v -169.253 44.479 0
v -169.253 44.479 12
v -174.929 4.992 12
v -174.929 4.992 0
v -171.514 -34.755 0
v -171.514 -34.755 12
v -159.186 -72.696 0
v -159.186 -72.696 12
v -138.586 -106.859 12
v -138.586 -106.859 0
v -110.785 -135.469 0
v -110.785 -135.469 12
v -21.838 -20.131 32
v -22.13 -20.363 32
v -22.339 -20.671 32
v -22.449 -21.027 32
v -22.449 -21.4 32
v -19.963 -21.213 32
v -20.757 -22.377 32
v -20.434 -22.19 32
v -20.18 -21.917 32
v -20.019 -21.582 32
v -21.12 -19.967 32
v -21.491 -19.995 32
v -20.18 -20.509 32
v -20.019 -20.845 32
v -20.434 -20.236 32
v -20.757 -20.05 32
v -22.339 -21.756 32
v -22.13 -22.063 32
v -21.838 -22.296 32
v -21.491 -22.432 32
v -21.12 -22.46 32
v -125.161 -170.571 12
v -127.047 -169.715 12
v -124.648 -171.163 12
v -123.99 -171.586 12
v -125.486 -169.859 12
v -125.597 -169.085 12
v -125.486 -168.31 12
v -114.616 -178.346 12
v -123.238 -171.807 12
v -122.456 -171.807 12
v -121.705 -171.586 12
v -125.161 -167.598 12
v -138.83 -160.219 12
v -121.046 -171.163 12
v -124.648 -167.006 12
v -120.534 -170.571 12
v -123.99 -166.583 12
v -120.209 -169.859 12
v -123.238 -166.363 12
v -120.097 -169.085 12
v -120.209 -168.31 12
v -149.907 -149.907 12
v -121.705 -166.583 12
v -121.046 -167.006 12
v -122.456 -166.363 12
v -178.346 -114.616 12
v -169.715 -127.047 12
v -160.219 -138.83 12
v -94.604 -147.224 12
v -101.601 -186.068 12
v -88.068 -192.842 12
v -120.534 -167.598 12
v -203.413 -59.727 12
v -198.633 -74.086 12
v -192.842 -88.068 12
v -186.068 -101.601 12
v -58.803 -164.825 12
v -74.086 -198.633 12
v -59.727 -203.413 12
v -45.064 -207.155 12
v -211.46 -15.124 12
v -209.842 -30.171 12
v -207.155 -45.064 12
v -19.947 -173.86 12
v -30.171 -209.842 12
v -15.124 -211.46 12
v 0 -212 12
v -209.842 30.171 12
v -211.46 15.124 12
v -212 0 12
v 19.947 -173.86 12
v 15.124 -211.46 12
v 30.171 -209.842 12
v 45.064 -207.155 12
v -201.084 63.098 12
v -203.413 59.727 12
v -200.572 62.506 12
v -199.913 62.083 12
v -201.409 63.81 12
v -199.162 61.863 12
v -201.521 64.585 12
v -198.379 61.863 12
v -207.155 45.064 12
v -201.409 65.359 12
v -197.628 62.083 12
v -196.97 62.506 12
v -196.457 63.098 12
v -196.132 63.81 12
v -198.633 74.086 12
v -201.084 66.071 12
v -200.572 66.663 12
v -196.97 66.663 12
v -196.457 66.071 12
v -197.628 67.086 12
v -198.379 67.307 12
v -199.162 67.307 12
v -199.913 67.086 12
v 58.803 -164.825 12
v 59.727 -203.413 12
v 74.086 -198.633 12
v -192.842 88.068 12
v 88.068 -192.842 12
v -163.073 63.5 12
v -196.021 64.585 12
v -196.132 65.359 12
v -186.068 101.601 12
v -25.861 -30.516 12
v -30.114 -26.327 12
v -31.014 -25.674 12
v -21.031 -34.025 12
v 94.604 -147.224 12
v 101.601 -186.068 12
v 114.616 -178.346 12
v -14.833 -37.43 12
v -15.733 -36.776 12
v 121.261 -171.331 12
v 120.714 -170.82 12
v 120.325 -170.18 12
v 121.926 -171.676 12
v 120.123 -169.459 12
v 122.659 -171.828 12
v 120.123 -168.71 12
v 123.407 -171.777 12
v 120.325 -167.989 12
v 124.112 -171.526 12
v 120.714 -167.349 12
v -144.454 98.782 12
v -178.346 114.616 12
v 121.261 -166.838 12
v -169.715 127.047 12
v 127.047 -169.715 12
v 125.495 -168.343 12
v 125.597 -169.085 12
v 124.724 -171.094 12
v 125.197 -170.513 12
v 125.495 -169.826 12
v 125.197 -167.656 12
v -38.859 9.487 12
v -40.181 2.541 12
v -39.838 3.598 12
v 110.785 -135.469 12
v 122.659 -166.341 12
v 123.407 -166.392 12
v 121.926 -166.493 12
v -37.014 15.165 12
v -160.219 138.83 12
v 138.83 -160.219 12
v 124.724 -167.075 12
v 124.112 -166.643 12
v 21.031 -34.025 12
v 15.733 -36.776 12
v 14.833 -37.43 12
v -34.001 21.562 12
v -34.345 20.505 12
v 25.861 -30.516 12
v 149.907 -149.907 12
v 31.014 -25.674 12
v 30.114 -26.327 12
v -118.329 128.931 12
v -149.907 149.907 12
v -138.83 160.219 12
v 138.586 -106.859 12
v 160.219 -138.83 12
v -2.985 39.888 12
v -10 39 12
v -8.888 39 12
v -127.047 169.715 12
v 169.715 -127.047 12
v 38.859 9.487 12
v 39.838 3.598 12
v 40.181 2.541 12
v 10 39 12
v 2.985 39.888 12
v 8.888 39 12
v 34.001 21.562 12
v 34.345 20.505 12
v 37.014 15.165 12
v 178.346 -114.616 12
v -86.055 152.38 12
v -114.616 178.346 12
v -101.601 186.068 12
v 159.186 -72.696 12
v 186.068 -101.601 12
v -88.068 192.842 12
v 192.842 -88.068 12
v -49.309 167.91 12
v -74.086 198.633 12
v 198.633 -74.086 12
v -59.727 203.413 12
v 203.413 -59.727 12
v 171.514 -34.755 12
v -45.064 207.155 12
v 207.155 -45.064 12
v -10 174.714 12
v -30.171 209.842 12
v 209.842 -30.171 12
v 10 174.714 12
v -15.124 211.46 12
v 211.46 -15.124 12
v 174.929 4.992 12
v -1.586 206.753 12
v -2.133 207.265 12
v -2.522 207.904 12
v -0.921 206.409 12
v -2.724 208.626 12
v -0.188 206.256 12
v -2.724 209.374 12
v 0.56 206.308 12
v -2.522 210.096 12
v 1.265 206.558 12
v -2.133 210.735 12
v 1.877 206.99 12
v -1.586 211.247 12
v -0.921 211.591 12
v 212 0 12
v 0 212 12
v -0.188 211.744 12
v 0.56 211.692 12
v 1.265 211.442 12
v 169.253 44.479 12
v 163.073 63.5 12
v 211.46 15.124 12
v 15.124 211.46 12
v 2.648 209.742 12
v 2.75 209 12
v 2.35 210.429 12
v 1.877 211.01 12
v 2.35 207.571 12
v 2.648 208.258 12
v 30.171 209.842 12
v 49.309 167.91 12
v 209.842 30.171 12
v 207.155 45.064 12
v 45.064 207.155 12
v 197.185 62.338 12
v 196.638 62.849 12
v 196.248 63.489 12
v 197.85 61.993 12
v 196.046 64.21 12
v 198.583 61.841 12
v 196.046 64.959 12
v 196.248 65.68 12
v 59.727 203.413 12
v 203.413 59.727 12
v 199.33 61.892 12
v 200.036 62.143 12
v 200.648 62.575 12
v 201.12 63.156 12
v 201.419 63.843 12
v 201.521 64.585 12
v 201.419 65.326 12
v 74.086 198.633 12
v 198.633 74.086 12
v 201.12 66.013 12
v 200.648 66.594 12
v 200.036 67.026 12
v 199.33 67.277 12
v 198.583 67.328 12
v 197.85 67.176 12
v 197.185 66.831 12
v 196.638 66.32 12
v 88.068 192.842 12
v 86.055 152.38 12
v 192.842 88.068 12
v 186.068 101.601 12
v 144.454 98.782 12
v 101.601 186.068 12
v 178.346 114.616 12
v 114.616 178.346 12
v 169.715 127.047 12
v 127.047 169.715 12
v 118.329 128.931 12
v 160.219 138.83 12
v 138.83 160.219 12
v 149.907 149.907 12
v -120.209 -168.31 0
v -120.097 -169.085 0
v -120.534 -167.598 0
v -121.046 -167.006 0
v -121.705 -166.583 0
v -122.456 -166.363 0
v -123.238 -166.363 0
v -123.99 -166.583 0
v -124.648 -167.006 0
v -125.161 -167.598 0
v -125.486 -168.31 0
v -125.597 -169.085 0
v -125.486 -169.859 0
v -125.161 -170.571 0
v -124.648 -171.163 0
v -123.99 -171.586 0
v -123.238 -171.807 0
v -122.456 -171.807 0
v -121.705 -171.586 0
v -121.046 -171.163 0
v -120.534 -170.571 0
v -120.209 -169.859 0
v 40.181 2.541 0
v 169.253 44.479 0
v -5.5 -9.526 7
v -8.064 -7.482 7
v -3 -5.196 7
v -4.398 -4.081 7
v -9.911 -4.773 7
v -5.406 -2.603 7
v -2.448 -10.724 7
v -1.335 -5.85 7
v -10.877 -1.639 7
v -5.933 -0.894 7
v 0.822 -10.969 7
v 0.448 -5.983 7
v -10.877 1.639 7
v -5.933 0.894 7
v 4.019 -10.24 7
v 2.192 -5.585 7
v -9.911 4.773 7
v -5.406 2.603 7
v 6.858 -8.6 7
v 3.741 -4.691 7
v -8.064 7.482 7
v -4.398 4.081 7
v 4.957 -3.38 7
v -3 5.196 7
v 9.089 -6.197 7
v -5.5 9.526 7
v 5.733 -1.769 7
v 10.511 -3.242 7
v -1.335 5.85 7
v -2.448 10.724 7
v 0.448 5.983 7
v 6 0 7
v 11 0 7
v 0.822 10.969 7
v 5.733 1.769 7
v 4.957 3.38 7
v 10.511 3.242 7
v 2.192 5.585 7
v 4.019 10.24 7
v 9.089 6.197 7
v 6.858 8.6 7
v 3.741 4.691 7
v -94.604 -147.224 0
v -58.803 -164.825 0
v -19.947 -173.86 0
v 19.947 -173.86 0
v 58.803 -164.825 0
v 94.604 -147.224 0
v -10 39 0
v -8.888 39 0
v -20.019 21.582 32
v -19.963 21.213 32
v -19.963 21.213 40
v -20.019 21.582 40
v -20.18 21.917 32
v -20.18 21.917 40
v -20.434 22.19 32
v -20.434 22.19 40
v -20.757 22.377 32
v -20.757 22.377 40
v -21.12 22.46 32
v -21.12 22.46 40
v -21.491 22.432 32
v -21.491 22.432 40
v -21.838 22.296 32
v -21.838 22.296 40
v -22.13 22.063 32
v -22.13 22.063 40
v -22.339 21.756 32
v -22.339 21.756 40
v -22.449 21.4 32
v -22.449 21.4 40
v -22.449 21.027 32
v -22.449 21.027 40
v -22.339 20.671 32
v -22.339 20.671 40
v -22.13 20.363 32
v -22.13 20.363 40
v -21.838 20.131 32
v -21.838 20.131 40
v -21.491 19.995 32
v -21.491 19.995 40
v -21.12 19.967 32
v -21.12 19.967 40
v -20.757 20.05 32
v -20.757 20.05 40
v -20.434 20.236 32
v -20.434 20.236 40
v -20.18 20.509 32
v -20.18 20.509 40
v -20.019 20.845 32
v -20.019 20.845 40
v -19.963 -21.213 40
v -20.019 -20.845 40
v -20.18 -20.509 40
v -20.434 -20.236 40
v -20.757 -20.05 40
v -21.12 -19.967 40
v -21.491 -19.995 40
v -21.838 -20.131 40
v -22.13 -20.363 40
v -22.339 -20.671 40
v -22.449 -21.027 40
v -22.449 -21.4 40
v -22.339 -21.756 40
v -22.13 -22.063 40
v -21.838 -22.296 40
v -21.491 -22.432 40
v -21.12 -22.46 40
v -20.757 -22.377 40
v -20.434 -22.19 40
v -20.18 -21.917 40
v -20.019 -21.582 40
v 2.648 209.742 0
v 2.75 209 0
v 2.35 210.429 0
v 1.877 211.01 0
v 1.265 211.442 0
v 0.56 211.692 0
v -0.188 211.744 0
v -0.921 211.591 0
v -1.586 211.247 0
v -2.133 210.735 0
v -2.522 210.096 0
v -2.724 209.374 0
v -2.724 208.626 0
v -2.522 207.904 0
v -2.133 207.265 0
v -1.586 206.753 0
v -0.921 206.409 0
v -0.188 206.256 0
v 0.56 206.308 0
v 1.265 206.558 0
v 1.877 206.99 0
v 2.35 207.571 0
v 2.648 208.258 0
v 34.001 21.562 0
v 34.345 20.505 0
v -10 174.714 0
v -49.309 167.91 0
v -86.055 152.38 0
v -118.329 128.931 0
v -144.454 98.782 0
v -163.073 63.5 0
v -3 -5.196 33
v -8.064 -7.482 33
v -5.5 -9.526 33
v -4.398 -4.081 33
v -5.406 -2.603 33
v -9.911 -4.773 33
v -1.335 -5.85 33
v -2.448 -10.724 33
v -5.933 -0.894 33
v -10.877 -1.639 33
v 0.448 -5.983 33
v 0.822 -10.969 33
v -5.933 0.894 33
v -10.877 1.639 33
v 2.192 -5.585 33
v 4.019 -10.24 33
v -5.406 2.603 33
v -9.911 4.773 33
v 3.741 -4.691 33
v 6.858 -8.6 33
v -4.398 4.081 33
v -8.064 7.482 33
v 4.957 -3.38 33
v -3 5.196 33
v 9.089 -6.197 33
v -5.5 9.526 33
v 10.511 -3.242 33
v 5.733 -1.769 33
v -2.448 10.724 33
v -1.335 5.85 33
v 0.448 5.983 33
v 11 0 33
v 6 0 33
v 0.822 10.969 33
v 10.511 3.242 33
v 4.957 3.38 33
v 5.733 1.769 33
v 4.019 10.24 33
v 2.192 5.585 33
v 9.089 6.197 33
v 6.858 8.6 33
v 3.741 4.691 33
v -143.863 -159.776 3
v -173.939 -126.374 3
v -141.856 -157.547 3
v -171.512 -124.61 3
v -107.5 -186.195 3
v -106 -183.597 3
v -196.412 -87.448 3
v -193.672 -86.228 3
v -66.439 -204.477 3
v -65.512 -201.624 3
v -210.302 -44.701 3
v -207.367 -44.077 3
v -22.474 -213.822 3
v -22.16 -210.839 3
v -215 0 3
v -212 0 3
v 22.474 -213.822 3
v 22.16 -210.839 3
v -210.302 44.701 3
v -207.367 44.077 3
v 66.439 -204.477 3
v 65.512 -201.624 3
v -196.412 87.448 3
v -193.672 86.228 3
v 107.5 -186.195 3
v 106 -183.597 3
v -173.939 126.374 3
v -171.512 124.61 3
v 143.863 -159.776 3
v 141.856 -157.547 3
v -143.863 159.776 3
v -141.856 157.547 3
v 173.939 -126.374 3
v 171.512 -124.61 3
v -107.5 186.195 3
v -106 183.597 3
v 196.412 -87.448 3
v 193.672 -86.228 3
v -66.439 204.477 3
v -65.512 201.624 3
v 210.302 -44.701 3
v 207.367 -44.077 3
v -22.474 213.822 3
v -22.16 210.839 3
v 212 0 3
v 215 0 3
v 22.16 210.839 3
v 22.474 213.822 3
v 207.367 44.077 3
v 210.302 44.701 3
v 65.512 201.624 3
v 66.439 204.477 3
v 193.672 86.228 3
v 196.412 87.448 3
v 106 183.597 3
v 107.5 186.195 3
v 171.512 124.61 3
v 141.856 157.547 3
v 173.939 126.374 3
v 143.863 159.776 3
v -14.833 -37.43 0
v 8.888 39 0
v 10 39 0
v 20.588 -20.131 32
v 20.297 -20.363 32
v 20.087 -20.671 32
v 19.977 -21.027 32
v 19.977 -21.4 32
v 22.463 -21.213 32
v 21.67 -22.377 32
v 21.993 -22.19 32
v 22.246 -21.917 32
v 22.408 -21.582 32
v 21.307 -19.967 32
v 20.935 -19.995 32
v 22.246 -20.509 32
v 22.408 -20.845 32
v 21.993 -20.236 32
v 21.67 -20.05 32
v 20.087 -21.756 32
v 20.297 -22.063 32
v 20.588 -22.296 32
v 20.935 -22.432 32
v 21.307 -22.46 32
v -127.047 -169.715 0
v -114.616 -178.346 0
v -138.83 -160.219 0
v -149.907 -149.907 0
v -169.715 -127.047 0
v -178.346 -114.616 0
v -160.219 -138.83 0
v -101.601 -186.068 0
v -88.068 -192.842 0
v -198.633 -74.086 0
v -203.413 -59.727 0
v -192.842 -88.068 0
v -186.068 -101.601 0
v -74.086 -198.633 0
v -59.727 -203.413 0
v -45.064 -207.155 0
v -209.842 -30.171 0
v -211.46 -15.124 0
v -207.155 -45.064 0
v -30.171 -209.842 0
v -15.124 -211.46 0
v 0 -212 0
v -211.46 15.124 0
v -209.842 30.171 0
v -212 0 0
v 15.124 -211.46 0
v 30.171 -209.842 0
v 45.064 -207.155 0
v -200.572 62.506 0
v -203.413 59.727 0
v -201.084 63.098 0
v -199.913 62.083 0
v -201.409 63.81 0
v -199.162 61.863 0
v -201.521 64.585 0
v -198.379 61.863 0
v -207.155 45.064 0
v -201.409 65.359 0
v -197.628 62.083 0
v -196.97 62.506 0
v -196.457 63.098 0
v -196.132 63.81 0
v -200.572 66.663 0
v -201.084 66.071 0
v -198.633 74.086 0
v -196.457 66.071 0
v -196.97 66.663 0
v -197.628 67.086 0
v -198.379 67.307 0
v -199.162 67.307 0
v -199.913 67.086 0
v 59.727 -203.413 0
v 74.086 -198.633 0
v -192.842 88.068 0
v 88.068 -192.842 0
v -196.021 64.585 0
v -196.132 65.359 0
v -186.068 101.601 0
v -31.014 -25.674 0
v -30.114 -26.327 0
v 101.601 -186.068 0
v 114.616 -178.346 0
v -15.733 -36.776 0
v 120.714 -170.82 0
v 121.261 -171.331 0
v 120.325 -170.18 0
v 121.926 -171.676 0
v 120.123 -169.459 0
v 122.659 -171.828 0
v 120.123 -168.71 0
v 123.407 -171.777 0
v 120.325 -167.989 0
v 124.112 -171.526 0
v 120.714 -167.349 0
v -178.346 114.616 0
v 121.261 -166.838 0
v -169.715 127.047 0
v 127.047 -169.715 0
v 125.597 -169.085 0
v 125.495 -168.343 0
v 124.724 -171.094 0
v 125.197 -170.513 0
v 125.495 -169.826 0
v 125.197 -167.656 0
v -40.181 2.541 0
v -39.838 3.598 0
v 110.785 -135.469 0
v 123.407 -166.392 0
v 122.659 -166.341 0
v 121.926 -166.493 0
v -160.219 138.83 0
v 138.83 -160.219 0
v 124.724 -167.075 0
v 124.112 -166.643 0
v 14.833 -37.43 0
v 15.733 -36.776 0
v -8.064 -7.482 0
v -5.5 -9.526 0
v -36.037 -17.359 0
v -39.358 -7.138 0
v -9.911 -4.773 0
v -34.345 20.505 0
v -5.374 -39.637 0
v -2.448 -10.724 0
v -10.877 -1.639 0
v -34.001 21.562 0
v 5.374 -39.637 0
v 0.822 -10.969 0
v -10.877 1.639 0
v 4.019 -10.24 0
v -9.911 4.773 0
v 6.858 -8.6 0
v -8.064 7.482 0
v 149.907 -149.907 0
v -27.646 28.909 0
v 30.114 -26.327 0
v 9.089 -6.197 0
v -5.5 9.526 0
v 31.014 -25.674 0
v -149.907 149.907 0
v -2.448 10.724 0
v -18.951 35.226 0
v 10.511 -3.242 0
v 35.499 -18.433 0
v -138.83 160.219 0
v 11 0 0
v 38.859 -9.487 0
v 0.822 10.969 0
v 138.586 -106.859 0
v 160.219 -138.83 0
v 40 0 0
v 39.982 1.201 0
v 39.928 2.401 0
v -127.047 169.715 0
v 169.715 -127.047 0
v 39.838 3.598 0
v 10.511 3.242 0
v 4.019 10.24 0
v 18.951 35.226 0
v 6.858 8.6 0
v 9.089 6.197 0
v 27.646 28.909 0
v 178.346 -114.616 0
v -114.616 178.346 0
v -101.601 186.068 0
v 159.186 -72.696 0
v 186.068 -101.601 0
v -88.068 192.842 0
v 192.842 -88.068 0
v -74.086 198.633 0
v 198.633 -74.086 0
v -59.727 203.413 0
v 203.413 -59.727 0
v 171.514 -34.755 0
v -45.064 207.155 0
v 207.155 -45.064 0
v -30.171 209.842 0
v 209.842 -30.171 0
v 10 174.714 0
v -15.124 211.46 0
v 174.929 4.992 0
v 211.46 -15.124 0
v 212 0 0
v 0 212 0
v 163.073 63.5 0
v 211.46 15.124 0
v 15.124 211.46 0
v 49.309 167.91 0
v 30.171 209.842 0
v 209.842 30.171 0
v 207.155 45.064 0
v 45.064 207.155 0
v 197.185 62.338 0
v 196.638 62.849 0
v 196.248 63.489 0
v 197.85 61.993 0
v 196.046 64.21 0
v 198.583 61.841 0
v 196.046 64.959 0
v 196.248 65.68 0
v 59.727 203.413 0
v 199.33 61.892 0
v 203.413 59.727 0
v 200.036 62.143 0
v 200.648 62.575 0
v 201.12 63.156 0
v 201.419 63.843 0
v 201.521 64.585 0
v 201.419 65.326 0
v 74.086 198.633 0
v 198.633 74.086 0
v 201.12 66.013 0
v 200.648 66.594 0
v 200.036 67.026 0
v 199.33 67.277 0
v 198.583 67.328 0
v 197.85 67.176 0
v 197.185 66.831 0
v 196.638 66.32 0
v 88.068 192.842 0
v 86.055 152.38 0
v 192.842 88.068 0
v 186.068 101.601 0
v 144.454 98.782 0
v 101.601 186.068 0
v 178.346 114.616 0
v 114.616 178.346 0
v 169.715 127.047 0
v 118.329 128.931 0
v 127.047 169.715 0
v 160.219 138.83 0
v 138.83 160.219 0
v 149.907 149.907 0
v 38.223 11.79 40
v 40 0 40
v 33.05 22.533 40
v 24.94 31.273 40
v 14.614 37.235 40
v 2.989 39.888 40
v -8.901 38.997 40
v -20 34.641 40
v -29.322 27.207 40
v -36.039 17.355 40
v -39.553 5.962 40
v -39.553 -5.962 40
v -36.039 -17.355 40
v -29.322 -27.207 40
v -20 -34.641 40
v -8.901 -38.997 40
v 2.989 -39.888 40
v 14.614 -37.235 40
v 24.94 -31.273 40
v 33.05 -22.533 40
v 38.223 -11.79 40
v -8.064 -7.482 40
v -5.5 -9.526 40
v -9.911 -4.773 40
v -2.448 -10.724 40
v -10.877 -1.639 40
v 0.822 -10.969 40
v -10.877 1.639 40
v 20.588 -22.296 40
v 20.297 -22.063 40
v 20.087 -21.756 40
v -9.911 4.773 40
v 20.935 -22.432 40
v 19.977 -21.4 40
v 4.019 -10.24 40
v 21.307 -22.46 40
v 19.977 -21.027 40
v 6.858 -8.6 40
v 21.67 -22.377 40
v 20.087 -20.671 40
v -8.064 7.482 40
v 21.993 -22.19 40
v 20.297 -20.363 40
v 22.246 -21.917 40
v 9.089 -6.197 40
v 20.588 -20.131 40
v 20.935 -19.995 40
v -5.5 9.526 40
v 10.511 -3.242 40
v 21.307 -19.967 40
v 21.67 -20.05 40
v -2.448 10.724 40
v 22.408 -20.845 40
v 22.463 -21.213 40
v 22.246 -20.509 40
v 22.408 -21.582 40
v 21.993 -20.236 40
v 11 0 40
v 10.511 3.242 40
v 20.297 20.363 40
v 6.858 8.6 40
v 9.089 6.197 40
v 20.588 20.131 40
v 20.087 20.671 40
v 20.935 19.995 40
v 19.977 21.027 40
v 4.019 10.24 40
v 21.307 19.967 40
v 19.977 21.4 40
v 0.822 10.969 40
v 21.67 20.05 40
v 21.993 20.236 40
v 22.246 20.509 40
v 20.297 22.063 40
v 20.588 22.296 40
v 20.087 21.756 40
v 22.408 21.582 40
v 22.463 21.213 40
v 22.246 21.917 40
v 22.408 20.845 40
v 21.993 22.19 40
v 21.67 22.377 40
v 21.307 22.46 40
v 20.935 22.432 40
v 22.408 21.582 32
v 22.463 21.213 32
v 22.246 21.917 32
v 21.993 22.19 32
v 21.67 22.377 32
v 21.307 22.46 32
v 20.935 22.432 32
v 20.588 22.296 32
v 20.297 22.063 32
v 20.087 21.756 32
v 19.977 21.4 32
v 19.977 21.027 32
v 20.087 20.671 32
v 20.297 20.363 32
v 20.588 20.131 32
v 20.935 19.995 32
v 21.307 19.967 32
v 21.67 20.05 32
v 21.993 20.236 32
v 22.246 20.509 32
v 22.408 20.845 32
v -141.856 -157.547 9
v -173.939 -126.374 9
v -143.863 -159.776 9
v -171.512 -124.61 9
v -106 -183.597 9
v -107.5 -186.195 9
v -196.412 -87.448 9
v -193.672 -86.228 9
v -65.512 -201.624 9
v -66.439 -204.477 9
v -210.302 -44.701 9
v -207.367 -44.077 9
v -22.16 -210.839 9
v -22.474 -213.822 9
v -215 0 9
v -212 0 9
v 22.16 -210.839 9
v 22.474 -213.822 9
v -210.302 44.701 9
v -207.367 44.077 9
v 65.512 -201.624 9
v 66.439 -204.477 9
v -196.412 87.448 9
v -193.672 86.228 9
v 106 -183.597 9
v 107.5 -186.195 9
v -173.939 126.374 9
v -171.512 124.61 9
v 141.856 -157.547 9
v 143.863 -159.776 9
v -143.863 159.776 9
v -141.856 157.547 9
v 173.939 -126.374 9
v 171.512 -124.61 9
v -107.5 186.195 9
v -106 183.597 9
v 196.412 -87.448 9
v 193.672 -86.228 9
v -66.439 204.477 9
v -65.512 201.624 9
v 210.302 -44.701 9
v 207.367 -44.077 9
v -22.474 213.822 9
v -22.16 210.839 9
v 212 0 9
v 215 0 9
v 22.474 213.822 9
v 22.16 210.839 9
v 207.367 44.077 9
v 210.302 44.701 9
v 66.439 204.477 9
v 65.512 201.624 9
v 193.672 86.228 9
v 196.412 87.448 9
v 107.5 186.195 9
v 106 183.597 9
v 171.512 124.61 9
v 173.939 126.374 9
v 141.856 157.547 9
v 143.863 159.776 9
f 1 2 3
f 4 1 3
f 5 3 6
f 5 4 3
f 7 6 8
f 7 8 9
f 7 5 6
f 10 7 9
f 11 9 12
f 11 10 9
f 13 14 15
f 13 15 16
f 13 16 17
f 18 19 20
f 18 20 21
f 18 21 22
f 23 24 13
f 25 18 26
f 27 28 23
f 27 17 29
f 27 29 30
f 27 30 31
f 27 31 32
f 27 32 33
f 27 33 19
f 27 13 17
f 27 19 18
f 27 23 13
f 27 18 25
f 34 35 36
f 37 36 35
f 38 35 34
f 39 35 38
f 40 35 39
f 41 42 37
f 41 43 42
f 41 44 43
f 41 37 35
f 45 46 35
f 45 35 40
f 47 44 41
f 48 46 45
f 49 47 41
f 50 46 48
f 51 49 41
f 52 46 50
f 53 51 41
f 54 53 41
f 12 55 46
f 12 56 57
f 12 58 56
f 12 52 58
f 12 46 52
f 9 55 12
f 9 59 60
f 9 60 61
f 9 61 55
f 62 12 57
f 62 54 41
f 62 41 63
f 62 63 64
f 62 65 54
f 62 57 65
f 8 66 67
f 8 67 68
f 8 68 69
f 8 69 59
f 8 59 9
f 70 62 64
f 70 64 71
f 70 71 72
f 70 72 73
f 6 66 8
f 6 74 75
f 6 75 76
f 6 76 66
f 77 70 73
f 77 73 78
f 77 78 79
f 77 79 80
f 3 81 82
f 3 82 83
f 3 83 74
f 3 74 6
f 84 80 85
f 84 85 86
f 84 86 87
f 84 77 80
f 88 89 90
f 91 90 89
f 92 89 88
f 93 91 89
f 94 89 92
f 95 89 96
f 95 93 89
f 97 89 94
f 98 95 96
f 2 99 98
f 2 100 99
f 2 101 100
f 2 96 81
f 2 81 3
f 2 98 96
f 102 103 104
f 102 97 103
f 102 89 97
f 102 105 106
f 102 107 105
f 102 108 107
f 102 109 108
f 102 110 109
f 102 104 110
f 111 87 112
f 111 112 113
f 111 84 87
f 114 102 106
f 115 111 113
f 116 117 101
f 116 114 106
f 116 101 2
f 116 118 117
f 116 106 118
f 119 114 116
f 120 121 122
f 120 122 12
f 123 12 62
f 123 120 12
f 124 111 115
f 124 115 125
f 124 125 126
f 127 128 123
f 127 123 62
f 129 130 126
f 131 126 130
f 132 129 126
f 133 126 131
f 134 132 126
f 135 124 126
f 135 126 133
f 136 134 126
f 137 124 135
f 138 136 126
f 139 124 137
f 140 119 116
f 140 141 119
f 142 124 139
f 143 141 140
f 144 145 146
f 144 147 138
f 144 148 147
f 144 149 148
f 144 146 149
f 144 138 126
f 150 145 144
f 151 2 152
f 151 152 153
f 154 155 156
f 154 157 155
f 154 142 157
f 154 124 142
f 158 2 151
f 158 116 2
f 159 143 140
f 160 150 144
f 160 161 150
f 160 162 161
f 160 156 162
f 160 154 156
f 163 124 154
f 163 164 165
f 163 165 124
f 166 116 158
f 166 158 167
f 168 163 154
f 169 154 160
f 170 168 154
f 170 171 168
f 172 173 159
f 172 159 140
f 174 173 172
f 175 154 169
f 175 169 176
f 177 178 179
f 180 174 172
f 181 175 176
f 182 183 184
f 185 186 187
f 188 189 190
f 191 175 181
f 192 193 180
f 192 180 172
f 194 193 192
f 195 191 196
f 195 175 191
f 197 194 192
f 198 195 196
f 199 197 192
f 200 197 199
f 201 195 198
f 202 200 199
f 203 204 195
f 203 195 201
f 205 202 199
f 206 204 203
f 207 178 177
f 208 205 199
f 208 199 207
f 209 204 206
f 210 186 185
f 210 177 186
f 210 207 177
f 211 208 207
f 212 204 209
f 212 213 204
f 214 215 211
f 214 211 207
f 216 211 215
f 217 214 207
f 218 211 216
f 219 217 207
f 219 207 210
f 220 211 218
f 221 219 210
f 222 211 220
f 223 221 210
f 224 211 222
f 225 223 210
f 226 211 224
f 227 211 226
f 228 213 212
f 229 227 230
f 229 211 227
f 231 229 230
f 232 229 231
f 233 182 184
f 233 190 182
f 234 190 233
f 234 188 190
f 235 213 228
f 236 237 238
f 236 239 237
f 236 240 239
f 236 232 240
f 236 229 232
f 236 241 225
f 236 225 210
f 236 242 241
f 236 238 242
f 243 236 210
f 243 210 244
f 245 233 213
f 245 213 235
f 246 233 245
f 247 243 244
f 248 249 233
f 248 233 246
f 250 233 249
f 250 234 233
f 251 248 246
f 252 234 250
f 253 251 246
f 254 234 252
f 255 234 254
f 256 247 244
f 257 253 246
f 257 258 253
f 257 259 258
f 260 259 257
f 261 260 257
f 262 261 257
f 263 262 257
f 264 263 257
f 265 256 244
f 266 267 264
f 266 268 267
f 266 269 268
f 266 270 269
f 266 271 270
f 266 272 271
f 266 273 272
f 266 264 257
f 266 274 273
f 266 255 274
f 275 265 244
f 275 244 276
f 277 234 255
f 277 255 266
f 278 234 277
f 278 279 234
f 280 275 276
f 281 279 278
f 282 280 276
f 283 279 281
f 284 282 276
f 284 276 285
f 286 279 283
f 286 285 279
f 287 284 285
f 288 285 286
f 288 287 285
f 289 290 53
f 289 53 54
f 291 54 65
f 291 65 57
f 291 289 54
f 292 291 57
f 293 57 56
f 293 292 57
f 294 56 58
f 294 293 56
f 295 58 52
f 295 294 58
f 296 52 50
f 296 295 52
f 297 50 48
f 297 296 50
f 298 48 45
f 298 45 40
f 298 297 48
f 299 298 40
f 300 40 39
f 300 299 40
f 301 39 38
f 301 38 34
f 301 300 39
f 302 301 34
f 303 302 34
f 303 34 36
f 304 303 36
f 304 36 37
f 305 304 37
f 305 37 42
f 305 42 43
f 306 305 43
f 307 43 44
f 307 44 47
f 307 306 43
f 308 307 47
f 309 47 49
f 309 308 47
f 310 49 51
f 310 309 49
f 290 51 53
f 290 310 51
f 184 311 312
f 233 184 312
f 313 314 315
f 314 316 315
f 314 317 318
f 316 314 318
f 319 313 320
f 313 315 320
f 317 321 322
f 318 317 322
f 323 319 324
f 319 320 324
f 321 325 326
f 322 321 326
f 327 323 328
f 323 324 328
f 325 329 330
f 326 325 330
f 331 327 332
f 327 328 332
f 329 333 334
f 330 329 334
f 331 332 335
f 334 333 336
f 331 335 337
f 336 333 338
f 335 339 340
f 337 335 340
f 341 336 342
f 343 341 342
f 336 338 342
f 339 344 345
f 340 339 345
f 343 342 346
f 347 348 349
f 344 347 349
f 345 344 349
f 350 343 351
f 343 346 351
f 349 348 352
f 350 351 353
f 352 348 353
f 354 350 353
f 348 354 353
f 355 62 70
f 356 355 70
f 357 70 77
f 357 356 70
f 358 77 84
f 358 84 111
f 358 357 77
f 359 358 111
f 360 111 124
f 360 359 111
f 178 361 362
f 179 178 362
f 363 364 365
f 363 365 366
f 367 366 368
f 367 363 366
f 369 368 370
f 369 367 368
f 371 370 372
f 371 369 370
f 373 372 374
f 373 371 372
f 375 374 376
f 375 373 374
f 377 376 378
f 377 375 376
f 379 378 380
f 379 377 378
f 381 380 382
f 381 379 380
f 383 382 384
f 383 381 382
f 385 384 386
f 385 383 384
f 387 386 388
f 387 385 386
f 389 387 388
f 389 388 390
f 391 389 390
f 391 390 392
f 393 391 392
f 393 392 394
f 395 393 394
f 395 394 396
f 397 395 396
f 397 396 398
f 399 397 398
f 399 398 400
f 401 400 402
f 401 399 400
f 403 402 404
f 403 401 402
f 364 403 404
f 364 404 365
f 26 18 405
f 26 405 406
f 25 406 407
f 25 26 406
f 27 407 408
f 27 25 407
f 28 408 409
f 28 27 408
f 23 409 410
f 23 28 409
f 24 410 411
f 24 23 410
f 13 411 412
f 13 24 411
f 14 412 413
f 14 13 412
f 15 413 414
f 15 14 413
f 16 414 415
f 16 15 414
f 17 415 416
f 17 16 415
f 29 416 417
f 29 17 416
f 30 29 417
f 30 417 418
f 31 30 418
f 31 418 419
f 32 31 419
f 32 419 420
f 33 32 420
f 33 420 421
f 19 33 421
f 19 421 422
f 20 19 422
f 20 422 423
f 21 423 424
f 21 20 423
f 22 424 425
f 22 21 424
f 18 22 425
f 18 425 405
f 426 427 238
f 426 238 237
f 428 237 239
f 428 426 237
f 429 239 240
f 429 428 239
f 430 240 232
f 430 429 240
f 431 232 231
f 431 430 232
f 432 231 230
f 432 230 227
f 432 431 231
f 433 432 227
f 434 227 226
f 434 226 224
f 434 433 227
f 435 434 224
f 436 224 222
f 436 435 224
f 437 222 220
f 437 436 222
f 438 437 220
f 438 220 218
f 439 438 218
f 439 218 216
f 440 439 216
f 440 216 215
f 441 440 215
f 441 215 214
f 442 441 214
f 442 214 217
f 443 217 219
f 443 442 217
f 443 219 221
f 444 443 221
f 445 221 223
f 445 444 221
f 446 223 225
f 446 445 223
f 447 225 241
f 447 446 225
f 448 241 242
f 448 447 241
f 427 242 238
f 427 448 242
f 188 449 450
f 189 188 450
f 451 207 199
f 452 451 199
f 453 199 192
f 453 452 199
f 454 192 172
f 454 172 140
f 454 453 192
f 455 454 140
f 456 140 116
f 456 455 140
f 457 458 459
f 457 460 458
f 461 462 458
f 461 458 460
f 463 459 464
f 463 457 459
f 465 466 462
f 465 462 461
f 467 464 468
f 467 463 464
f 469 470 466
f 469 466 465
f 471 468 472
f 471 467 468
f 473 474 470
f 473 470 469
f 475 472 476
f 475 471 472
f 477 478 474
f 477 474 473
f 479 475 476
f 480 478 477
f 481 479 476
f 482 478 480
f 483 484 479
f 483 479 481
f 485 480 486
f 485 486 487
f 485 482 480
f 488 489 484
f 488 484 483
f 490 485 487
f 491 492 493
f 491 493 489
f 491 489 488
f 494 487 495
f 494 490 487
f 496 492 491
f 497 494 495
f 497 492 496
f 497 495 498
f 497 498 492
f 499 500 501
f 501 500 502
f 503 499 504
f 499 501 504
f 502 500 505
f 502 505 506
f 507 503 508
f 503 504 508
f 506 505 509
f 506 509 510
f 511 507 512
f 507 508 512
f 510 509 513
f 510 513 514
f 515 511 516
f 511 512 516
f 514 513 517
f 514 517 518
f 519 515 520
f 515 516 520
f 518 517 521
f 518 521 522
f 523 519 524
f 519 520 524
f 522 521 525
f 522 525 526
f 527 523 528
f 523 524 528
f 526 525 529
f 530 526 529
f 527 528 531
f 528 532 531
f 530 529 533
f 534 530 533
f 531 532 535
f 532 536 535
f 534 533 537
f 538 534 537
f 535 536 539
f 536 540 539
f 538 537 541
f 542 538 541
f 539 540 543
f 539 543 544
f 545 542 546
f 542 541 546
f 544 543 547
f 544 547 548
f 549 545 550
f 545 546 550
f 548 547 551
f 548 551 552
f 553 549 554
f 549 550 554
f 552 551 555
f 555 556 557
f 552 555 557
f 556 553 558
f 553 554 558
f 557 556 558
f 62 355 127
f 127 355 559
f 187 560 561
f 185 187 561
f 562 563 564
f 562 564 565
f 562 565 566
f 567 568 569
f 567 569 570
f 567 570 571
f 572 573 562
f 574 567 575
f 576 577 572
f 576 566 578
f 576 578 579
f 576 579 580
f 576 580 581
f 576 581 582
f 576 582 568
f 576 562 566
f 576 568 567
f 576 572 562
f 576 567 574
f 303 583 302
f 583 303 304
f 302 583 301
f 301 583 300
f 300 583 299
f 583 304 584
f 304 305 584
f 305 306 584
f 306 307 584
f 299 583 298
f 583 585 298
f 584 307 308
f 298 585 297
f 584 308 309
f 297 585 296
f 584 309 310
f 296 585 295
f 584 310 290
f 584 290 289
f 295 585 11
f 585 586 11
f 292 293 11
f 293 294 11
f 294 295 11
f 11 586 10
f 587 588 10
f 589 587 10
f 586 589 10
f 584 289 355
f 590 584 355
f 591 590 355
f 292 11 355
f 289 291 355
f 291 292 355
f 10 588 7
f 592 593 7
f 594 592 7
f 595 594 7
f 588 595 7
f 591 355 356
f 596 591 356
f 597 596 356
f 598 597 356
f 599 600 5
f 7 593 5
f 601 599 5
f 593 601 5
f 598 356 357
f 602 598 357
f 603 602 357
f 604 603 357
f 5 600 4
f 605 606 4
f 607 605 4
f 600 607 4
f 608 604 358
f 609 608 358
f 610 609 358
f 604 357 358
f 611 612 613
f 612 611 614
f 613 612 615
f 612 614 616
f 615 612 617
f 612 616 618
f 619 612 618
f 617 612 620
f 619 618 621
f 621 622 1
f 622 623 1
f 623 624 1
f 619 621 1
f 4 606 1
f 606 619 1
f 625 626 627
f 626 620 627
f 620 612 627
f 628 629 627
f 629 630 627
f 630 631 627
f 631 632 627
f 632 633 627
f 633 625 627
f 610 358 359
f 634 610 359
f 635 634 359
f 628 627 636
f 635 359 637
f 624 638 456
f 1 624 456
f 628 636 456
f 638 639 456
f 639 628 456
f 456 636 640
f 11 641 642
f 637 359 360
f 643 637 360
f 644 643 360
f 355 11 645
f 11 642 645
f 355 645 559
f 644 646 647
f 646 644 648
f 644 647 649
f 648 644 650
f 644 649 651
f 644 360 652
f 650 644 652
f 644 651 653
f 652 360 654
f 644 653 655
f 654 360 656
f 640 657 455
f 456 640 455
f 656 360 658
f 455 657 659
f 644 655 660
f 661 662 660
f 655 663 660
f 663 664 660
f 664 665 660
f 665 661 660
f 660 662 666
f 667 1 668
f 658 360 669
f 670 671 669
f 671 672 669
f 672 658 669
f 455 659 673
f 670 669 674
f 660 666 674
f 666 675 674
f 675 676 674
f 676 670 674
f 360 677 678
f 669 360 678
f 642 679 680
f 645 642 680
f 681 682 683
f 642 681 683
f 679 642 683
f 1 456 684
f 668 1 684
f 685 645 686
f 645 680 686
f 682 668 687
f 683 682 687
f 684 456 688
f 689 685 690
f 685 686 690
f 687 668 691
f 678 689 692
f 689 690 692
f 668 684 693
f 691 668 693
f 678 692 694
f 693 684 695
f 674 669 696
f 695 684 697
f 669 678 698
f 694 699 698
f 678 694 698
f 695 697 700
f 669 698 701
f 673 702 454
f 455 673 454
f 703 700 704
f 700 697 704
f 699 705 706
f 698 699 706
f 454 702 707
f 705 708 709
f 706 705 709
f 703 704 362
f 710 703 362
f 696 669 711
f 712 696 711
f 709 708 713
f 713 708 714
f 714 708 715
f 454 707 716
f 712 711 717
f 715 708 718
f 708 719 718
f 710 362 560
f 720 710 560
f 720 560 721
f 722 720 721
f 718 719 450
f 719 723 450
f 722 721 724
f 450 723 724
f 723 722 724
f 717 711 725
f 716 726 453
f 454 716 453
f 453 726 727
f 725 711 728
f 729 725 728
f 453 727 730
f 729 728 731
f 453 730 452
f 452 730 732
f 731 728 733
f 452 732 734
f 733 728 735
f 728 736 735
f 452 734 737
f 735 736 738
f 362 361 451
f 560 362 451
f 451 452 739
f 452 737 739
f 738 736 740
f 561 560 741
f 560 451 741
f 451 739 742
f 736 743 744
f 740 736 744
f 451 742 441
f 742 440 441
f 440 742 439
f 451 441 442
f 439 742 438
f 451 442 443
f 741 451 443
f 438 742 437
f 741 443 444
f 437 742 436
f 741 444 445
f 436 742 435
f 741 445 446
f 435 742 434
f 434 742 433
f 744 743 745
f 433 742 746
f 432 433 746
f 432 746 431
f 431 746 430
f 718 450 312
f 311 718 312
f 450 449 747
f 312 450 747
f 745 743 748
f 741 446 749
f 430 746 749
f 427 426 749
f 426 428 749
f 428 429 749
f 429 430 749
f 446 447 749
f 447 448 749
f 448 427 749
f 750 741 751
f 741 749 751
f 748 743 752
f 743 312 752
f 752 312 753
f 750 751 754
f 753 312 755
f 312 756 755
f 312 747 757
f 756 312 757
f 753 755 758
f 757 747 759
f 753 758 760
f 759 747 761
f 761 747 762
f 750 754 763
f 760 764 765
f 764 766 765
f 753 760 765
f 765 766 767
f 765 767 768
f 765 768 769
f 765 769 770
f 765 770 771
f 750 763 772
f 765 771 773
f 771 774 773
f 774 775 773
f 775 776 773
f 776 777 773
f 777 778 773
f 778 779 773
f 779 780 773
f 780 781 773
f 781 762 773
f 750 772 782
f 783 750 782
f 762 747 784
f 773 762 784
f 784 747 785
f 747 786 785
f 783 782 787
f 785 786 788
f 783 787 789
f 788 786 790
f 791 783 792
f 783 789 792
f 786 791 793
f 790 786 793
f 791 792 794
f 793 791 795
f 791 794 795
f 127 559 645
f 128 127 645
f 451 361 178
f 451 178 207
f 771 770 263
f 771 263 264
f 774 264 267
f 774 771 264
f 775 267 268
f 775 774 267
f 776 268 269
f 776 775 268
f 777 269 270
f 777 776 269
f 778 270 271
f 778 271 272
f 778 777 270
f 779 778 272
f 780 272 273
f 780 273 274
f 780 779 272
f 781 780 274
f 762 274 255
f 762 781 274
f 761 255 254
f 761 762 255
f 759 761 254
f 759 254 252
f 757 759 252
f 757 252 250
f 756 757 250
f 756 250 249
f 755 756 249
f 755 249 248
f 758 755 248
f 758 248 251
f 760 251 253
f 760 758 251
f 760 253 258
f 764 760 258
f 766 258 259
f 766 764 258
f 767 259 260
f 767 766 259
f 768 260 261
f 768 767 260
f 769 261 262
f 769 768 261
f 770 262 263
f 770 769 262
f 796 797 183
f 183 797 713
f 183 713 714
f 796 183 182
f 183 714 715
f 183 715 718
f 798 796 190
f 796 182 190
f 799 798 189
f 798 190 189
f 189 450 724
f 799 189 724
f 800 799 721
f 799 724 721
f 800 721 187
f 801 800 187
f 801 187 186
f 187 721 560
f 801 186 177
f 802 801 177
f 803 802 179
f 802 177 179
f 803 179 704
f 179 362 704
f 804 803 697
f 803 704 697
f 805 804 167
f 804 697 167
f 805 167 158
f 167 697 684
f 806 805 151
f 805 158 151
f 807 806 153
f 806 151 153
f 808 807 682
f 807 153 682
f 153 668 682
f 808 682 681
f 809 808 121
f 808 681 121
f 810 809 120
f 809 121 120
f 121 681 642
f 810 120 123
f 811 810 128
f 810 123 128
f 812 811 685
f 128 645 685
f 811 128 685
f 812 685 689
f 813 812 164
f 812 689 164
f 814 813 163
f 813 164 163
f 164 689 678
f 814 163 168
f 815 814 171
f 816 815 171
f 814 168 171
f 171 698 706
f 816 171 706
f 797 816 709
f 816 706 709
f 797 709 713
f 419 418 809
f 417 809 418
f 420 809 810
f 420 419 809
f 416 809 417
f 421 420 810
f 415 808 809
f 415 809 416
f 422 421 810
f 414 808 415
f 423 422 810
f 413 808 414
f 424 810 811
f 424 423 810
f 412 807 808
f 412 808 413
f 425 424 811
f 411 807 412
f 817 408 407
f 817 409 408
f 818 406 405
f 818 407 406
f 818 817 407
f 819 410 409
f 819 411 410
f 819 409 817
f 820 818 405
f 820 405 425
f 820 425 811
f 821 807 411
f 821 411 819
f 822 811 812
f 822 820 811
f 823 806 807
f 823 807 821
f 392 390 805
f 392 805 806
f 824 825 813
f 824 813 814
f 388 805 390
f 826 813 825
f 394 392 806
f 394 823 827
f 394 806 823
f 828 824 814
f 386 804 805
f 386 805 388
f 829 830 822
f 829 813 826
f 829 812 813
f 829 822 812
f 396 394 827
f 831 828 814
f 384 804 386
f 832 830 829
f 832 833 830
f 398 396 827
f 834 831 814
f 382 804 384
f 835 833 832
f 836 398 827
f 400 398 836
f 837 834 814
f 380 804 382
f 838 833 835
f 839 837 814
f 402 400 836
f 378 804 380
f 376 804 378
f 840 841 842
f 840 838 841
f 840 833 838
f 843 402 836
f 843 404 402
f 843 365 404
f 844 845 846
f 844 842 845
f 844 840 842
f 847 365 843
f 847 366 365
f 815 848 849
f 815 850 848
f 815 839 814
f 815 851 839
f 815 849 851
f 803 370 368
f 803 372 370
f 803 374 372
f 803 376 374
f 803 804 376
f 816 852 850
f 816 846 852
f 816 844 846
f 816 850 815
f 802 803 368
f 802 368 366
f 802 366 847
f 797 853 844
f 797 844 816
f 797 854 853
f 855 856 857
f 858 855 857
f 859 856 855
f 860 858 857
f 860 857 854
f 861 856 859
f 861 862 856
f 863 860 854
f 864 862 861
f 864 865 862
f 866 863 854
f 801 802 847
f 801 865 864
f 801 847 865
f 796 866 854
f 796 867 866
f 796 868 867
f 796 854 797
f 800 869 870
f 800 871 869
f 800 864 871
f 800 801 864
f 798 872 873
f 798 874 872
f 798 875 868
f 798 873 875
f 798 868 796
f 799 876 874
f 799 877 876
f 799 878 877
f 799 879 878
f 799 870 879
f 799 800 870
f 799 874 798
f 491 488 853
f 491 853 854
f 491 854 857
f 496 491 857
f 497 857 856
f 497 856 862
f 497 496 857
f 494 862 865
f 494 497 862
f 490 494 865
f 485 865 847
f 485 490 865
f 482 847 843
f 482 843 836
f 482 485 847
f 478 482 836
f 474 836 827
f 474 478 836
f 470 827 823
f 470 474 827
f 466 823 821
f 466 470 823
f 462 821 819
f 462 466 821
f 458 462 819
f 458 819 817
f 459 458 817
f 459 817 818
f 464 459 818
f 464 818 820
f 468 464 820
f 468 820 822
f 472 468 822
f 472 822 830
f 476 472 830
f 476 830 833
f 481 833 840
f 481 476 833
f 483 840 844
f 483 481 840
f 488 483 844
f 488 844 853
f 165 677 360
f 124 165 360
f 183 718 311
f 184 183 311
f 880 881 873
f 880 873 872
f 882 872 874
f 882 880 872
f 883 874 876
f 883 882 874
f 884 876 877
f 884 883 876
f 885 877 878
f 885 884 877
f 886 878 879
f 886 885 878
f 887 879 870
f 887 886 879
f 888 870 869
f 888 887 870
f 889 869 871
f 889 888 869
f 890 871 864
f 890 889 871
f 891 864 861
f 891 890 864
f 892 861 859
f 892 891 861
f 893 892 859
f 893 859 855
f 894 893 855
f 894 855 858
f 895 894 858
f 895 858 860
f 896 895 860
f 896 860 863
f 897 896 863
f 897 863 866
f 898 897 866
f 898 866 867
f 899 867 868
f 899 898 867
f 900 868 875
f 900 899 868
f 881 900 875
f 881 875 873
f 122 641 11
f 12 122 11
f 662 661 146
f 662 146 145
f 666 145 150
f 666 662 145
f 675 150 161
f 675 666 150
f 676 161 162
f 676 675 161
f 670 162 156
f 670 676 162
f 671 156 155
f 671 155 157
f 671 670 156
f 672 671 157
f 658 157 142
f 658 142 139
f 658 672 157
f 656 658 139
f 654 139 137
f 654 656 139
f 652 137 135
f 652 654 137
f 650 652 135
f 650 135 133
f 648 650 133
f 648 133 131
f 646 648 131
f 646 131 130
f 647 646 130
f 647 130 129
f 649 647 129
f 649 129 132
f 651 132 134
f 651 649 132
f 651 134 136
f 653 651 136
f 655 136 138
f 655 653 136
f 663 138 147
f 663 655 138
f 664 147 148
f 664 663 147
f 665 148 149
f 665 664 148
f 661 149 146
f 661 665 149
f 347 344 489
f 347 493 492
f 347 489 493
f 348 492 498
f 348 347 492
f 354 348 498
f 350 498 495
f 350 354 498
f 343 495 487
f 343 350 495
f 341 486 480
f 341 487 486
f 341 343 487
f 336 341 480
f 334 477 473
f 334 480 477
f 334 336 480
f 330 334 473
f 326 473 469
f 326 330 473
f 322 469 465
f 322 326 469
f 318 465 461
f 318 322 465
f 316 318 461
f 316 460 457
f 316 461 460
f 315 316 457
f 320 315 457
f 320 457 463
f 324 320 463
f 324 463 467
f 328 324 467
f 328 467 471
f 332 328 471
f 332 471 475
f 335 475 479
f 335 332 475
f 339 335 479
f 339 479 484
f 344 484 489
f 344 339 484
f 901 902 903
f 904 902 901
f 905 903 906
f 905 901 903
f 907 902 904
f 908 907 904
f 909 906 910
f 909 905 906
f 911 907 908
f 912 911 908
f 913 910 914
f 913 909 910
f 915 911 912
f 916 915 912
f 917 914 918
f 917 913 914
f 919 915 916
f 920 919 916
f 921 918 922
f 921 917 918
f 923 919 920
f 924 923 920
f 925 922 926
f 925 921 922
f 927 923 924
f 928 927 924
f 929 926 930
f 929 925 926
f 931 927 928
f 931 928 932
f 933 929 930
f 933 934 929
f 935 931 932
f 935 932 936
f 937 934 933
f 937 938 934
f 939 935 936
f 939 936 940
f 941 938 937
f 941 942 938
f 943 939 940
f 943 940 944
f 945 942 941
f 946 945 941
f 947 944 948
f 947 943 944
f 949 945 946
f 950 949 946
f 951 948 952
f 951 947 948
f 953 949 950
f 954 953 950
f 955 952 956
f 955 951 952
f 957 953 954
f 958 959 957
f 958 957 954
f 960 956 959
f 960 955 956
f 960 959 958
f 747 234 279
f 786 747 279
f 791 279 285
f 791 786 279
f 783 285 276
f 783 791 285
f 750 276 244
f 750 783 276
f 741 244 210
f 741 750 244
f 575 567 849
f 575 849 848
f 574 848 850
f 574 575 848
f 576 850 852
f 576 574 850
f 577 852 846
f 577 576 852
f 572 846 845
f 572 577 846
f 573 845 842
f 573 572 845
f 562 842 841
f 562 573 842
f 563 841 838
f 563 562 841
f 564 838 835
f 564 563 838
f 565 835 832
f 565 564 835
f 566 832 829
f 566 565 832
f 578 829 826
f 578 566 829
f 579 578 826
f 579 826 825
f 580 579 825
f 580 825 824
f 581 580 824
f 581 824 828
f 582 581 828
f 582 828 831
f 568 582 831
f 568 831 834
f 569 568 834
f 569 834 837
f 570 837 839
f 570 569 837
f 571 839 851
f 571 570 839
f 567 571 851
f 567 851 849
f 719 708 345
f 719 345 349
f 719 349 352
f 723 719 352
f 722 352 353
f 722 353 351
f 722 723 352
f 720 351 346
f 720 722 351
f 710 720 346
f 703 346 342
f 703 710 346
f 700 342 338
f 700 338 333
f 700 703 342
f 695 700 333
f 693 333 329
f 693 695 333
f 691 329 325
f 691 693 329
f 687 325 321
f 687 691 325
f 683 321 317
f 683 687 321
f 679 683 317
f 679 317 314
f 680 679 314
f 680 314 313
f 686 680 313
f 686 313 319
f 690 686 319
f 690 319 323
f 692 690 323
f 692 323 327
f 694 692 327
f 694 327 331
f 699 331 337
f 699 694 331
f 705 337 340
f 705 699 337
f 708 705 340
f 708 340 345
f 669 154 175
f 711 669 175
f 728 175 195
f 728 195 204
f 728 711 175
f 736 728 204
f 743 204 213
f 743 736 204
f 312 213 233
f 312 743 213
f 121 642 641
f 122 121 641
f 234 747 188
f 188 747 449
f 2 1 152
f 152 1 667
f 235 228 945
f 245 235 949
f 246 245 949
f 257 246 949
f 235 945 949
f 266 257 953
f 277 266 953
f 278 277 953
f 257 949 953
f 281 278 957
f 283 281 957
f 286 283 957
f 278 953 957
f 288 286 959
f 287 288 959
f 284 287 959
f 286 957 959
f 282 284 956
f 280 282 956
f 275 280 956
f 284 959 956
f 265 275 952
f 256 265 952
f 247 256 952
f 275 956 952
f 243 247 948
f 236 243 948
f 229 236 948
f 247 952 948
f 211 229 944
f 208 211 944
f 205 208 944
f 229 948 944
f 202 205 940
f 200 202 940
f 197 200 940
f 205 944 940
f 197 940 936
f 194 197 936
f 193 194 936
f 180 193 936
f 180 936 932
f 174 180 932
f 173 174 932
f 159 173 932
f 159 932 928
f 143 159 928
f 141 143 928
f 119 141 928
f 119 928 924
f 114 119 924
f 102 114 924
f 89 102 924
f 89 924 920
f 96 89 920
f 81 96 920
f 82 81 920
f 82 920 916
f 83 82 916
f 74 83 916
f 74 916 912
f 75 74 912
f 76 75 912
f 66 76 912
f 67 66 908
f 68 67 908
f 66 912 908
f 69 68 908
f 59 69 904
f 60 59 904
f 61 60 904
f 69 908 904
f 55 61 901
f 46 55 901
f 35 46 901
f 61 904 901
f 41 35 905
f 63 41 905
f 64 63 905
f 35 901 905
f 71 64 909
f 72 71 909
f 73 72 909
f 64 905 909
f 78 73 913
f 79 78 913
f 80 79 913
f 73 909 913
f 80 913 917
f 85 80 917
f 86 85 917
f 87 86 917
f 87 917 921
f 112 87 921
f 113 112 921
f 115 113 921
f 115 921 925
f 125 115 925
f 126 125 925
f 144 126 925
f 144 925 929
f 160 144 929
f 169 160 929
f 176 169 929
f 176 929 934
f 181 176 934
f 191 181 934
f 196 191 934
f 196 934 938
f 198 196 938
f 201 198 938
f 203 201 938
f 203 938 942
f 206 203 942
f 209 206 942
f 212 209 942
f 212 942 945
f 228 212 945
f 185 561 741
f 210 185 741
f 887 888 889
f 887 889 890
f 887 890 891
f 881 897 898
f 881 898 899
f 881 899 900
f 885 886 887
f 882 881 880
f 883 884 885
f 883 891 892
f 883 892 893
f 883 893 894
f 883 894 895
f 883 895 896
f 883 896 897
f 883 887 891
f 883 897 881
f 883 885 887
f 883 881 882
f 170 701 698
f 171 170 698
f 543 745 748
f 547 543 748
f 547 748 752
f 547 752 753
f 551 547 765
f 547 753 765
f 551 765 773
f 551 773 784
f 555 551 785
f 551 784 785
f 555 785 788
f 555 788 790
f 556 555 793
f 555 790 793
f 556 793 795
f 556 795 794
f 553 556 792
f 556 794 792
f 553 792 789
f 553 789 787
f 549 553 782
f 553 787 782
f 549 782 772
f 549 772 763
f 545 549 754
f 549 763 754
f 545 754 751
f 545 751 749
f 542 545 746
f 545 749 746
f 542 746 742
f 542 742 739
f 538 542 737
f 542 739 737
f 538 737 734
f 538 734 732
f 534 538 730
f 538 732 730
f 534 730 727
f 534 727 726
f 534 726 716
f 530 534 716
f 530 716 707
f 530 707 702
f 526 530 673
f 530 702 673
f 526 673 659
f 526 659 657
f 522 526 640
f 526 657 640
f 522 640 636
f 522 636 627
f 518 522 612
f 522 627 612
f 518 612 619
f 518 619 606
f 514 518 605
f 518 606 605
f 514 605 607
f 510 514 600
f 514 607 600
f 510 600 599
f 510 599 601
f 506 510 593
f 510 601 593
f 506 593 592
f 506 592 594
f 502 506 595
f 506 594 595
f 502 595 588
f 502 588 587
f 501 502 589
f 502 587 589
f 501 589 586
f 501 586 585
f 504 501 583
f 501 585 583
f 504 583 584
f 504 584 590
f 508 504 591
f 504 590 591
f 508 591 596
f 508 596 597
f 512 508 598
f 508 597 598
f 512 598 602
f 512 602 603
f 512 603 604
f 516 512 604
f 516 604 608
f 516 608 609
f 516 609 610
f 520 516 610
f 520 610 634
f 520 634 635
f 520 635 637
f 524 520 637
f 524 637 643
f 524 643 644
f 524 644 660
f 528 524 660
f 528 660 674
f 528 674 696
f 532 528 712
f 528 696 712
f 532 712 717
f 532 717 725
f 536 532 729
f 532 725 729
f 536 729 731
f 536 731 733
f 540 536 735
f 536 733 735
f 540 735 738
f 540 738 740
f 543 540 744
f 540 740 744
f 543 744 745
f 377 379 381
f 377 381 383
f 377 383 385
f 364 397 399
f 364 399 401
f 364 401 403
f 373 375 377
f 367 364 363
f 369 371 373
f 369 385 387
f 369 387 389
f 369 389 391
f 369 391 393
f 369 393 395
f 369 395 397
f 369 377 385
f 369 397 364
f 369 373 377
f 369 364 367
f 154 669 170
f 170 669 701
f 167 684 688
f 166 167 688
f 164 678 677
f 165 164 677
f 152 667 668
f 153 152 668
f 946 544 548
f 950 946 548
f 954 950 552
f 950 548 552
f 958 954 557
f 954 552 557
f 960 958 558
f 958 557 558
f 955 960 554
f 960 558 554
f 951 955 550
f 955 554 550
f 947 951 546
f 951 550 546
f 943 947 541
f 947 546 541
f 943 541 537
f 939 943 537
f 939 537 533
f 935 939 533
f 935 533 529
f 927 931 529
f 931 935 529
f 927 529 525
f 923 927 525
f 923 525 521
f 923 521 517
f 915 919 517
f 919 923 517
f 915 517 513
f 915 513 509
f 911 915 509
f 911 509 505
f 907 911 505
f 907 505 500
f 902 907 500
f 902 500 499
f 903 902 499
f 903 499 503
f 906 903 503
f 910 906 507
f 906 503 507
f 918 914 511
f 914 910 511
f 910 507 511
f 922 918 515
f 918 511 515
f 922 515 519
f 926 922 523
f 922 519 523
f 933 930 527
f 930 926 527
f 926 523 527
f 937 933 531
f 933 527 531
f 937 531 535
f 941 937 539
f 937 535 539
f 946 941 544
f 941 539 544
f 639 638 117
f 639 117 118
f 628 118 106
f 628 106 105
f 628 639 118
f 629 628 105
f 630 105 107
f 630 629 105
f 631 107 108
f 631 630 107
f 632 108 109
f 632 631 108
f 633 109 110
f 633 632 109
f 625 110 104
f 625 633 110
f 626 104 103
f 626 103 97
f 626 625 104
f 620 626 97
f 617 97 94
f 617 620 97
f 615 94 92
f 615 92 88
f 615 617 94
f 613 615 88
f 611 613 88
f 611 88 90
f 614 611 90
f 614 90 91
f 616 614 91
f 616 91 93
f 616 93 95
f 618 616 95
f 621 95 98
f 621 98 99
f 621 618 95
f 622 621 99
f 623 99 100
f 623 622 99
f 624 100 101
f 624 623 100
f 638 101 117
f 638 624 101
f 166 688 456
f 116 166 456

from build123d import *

# Parameters (mm, degrees)
SKETCH1_R               = 215
SKETCH1_R_2             = 175
RING_DEPTH              = 12
SKETCH2_R               = 40
HUB_DEPTH               = 40
SKETCH3_W               = 20
SKETCH3_H               = 137
SPOKES_DEPTH            = 12
SKETCH4_R               = 6
BORE_DEPTH              = 40
SKETCH5_R               = 11
BEARING_SEAT_LOW_DEPTH  = 7
SKETCH6_R               = 11
BEARING_SEAT_HIGH_DEPTH = 7
SKETCH7_R               = 216
SKETCH7_R_2             = 212
BAND_RABBET_DEPTH       = 3
SKETCH8_R               = 216
SKETCH8_R_2             = 212
COVER_RABBET_DEPTH      = 3
SKETCH9_R               = 2.75
ROD_HOLES_DEPTH         = 12
SKETCH10_R              = 1.25
GROMMET_SCREWS_DEPTH    = 8


with BuildPart() as part:
    # Sketch1 → Ring (new body)
    with BuildSketch(Plane.XY):
        Circle(SKETCH1_R)
        Circle(SKETCH1_R_2, mode=Mode.SUBTRACT)
    extrude(amount=RING_DEPTH)



with BuildPart() as body_2:
    # Sketch2 → Hub (new body)
    with BuildSketch(Plane.XY):
        Circle(SKETCH2_R)
    extrude(amount=HUB_DEPTH)


with BuildPart() as part_1:
    add(part.part)

    add(body_2.part)  # Spokes merges body 2
    # Sketch3 → Spokes (add)
    with BuildSketch(Plane.XY):
        Polygon((40.181374079, 2.541097618), (170.476116812, 44.876425847), (164.295776924, 63.897556173), (34.001034192, 21.562227944), align=None)
        with Locations((0, 107.5)):
            Rectangle(SKETCH3_W, SKETCH3_H)
        Polygon((-34.001034192, 21.562227944), (-164.295776924, 63.897556173), (-170.476116812, 44.876425847), (-40.181374079, 2.541097618), align=None)
        Polygon((-31.013794783, -25.673810258), (-111.540374347, -136.509138487), (-95.36003446, -148.264843533), (-14.833454896, -37.429515304), align=None)
        Polygon((14.833454896, -37.429515304), (95.36003446, -148.264843533), (111.540374347, -136.509138487), (31.013794783, -25.673810258), align=None)
    extrude(amount=SPOKES_DEPTH)

    # Sketch4 → Bore (cut)
    with BuildSketch(Plane.XY):
        Circle(SKETCH4_R)
    extrude(amount=BORE_DEPTH, mode=Mode.SUBTRACT)

    # Sketch5 → Bearing_seat_low (cut)
    with BuildSketch(Plane.XY):
        Circle(SKETCH5_R)
    extrude(amount=BEARING_SEAT_LOW_DEPTH, mode=Mode.SUBTRACT)

    # Sketch6 → Bearing_seat_high (cut)
    with BuildSketch(Plane.XY.offset(33)):
        Circle(SKETCH6_R)
    extrude(amount=BEARING_SEAT_HIGH_DEPTH, mode=Mode.SUBTRACT)

    # Sketch7 → Band_rabbet (cut)
    with BuildSketch(Plane.XY):
        Circle(SKETCH7_R)
        Circle(SKETCH7_R_2, mode=Mode.SUBTRACT)
    extrude(amount=BAND_RABBET_DEPTH, mode=Mode.SUBTRACT)

    # Sketch8 → Cover_rabbet (cut)
    with BuildSketch(Plane.XY.offset(9)):
        Circle(SKETCH8_R)
        Circle(SKETCH8_R_2, mode=Mode.SUBTRACT)
    extrude(amount=COVER_RABBET_DEPTH, mode=Mode.SUBTRACT)

    # Sketch9 → Rod_holes (cut)
    with BuildSketch(Plane.XY):
        with Locations((198.770811906, 64.584551824)):
            Circle(SKETCH9_R)
        with Locations((0, 209)):
            Circle(SKETCH9_R)
        with Locations((-198.770811906, 64.584551824)):
            Circle(SKETCH9_R)
        with Locations((-122.847117729, -169.084551824)):
            Circle(SKETCH9_R)
        with Locations((122.847117729, -169.084551824)):
            Circle(SKETCH9_R)
    extrude(amount=ROD_HOLES_DEPTH, mode=Mode.SUBTRACT)

    # Sketch10 → Grommet_screws (cut)
    with BuildSketch(Plane.XY.offset(32)):
        with Locations((21.213203436, 21.213203436)):
            Circle(SKETCH10_R)
        with Locations((-21.213203436, 21.213203436)):
            Circle(SKETCH10_R)
        with Locations((-21.213203436, -21.213203436)):
            Circle(SKETCH10_R)
        with Locations((21.213203436, -21.213203436)):
            Circle(SKETCH10_R)
    extrude(amount=GROMMET_SCREWS_DEPTH, mode=Mode.SUBTRACT)


solid = part_1.part
